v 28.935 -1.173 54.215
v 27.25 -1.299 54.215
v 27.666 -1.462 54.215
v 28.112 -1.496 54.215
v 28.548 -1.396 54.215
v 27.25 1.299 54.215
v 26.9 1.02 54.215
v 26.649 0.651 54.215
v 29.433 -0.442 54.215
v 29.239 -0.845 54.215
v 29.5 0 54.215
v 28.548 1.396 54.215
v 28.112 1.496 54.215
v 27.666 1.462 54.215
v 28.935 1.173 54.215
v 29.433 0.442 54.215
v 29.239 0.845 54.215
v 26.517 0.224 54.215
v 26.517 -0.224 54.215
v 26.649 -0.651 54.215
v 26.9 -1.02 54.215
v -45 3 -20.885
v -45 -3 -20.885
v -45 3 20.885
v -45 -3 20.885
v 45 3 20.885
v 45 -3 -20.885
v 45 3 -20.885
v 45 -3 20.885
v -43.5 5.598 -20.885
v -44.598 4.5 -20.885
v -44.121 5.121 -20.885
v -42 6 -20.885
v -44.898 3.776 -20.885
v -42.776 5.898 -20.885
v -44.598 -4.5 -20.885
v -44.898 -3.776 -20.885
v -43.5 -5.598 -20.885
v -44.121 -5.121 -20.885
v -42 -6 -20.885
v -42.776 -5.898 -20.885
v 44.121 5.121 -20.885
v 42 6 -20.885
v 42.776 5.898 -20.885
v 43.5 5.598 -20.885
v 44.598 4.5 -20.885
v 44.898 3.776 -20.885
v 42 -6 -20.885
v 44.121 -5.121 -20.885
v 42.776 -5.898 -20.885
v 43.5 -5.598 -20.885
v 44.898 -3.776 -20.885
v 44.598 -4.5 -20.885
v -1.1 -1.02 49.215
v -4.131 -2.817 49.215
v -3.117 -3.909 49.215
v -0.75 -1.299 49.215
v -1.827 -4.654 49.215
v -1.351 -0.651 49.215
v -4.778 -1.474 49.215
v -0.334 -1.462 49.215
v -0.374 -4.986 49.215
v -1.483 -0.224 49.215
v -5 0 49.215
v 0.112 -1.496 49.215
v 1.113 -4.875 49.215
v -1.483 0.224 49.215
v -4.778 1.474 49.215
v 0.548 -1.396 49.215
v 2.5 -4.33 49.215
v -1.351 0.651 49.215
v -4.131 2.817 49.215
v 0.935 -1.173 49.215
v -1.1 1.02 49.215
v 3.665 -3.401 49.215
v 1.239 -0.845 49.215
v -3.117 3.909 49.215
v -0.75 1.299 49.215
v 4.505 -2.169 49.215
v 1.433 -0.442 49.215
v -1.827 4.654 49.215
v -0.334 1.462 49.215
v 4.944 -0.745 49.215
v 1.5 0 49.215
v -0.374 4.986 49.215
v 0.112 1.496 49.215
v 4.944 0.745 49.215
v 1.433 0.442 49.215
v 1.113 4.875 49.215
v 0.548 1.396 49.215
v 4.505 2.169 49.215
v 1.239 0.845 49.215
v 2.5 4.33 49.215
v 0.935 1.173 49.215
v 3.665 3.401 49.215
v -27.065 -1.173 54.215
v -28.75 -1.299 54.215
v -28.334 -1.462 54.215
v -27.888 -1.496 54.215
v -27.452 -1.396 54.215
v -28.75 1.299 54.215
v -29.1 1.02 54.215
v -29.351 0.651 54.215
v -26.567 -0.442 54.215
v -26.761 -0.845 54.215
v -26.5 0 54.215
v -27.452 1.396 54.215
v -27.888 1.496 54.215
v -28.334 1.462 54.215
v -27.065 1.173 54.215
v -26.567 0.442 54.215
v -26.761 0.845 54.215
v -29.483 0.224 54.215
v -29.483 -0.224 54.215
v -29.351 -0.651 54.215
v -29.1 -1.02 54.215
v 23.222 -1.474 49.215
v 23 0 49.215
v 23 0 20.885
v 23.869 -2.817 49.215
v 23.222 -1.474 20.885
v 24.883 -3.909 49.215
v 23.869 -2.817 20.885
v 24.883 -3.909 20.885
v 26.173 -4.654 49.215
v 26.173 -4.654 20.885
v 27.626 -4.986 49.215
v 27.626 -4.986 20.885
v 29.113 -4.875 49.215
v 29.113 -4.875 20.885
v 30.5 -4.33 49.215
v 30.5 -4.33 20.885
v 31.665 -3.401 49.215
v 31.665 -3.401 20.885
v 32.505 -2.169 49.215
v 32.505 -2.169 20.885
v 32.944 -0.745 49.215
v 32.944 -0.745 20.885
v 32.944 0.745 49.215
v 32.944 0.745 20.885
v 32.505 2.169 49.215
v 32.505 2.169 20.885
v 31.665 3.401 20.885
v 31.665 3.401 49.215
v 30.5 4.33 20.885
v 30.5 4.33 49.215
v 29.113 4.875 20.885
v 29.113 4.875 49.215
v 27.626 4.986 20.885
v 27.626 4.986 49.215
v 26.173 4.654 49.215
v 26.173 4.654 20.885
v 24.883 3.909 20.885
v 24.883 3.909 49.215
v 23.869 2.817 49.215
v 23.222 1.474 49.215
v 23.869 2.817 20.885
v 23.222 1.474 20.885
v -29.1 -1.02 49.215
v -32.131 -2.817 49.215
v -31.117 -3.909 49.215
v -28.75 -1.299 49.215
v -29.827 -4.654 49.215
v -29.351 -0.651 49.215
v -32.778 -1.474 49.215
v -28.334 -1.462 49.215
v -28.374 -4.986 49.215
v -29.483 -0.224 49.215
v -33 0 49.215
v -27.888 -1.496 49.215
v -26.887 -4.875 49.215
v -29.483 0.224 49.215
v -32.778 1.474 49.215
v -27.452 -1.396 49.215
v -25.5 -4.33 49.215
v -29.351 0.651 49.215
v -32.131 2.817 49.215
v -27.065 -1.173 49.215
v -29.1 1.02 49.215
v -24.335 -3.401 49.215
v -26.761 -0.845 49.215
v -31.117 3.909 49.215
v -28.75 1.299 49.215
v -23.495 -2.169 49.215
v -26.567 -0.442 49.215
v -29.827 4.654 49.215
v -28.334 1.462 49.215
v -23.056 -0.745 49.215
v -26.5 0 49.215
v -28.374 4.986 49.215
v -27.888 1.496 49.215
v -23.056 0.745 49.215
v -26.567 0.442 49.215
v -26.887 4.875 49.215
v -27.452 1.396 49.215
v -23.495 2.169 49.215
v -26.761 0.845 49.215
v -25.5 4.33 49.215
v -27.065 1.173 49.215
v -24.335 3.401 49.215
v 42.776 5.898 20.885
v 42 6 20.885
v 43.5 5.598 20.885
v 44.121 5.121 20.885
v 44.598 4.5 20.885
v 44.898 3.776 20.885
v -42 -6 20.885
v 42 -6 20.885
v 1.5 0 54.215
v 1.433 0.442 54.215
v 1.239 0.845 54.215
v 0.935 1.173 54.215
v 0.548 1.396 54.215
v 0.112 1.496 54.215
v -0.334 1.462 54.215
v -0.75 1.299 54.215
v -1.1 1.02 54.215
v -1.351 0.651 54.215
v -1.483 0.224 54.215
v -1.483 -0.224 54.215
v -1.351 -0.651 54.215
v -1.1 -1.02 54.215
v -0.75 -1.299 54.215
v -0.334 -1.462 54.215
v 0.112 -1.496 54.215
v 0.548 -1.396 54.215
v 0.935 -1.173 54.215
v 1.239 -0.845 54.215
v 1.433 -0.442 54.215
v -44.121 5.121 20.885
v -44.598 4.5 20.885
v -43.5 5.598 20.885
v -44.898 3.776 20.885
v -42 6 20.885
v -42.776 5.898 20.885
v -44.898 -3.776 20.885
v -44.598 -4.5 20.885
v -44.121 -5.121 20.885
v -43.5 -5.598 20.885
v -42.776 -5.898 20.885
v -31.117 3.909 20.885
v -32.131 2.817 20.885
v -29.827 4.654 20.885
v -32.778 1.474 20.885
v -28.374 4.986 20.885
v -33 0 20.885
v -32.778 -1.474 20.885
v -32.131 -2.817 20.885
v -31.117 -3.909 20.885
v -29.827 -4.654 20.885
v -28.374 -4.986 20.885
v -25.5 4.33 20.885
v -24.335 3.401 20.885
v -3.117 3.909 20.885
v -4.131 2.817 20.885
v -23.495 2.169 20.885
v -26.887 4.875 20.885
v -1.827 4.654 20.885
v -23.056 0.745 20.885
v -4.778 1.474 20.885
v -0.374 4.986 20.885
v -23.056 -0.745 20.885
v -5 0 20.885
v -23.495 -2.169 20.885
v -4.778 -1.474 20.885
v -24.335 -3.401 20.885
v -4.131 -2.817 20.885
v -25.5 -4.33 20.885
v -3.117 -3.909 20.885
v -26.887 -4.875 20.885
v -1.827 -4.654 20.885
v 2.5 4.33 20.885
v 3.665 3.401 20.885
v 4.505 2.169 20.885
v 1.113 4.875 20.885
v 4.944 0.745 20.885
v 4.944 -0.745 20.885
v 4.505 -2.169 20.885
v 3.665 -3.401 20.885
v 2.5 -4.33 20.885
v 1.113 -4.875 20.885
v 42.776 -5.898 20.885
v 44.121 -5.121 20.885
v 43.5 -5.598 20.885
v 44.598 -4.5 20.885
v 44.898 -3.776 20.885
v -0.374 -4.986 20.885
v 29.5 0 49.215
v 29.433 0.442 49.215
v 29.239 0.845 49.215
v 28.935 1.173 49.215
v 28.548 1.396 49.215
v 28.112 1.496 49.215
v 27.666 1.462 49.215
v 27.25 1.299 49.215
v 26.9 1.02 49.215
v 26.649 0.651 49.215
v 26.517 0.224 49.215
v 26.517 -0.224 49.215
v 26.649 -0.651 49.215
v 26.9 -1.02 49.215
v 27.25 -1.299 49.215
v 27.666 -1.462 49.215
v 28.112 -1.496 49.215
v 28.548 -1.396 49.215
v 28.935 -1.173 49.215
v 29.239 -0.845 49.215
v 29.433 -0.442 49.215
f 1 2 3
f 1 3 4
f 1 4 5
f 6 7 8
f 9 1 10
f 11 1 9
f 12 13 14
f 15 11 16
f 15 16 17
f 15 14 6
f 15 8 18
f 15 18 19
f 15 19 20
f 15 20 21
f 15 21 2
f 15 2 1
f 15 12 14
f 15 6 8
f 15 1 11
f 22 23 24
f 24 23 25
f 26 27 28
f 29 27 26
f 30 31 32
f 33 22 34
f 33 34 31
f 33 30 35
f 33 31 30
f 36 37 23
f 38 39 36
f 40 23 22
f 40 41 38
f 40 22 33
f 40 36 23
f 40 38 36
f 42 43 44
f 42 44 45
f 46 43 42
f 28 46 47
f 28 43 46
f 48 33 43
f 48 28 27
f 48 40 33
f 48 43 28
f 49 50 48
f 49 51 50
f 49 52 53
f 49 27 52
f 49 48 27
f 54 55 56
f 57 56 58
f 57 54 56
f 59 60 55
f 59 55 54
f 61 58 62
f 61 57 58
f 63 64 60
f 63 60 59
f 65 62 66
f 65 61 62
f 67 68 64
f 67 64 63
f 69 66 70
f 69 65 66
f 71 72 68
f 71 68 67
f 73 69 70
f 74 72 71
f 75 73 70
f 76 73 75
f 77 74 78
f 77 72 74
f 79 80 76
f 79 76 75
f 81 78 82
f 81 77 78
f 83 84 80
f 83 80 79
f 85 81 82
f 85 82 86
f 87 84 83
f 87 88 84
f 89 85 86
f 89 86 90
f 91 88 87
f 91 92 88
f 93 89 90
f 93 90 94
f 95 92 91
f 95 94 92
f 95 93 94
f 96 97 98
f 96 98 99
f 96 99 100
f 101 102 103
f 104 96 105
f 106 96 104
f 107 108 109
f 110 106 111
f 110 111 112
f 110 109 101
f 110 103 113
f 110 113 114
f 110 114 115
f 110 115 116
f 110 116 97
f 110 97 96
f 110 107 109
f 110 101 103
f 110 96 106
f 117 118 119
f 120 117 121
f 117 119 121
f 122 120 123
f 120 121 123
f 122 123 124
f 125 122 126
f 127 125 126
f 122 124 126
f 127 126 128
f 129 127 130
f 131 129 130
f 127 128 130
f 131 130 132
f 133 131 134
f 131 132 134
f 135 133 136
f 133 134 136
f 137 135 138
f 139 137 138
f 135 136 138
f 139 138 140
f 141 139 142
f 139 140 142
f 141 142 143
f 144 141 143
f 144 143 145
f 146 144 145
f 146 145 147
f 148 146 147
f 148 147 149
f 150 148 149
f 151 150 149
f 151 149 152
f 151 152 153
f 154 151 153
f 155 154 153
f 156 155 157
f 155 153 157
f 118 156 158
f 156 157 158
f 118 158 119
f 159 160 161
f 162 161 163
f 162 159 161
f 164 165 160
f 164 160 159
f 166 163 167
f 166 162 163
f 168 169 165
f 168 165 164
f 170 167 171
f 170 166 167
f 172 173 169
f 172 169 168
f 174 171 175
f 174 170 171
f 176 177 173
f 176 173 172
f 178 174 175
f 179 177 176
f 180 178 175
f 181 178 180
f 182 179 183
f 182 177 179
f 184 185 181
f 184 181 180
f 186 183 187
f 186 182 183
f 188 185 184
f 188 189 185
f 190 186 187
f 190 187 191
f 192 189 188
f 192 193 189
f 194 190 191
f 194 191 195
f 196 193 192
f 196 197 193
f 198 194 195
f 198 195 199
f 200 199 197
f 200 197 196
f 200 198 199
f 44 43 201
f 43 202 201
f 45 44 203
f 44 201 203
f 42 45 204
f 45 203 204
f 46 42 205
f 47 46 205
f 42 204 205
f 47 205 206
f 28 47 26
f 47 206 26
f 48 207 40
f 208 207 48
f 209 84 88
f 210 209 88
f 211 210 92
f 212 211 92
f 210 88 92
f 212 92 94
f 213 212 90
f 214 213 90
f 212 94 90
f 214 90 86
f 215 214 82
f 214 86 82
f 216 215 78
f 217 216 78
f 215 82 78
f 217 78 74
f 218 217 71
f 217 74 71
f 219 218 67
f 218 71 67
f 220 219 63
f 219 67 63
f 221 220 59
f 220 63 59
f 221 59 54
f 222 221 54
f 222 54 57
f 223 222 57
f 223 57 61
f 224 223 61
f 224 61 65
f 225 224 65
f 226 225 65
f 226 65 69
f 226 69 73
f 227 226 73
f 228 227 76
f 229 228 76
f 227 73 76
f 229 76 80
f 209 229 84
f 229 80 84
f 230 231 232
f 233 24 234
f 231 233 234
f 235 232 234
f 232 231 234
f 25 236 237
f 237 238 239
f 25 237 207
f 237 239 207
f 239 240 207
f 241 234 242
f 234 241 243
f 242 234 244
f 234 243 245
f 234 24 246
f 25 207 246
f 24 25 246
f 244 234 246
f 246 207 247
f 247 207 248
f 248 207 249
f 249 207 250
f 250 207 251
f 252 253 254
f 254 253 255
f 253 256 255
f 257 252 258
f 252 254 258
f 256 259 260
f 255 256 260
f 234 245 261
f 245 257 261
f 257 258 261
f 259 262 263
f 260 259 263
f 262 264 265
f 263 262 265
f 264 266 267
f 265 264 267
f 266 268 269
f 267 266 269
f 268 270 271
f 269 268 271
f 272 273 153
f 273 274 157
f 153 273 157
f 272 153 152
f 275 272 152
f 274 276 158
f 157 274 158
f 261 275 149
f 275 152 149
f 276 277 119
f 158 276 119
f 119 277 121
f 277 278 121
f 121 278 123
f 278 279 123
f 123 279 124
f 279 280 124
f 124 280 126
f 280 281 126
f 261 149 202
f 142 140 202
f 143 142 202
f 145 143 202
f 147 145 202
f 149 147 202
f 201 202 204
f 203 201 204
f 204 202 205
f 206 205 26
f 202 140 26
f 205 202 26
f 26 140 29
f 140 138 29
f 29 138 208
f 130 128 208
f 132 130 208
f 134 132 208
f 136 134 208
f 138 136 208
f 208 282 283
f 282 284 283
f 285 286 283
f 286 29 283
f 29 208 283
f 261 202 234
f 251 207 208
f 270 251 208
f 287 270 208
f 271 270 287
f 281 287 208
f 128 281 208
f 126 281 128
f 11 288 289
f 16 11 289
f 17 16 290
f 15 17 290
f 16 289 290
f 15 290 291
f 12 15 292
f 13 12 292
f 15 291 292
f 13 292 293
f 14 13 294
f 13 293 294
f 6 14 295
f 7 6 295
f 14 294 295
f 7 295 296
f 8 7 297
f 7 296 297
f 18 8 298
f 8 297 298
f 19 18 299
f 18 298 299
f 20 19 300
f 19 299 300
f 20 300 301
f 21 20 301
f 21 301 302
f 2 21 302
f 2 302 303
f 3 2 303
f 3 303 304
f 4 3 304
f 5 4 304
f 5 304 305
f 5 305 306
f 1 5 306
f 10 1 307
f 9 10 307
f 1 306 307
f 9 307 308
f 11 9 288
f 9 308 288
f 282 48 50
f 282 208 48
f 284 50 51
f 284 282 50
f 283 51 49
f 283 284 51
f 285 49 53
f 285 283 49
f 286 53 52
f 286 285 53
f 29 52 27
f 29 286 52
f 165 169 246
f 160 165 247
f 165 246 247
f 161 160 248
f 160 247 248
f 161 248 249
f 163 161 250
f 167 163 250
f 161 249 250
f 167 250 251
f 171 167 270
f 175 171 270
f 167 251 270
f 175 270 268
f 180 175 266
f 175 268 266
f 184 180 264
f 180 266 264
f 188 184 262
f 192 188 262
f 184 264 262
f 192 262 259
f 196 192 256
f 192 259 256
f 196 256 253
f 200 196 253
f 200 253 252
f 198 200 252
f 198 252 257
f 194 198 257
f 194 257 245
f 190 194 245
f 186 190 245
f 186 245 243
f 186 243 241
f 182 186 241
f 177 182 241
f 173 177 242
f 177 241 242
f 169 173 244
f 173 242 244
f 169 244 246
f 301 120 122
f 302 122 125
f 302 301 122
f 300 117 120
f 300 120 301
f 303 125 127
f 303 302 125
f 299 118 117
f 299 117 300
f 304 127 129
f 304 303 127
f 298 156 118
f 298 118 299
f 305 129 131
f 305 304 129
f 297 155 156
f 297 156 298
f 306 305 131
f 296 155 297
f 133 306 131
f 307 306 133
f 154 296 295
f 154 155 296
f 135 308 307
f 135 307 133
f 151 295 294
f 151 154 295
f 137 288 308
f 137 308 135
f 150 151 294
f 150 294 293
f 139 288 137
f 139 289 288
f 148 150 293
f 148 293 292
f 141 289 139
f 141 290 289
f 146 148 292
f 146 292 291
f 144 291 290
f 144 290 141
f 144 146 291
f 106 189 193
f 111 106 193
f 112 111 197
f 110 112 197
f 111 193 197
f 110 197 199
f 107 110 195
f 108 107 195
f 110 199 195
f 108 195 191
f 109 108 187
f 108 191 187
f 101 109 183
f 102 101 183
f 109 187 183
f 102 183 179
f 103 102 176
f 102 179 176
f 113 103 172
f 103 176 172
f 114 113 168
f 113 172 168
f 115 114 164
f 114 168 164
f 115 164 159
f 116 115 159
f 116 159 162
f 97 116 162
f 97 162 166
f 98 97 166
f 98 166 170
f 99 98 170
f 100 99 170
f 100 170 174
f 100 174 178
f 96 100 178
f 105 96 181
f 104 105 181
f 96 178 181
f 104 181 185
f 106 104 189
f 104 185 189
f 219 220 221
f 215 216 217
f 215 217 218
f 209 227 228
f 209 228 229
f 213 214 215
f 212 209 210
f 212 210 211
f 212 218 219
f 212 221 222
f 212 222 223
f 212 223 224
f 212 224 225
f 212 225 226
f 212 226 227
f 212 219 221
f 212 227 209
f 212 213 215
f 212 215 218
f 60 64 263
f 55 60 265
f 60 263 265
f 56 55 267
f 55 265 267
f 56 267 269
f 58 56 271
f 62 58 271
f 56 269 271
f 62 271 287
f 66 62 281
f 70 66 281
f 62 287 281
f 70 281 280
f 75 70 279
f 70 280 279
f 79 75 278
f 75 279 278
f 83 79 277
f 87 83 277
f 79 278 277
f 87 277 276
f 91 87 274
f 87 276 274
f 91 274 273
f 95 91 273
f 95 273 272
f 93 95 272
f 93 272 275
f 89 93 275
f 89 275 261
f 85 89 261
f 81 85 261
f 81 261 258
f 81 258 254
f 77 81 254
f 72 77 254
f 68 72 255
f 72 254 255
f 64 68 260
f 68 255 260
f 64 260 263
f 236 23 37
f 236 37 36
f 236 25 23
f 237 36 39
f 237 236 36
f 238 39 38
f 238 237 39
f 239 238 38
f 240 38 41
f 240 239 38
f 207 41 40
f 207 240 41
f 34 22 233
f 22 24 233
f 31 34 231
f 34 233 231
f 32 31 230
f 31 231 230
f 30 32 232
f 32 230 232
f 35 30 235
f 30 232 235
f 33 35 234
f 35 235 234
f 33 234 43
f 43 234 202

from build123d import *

# Parameters (mm, degrees)
F0_W     = 90
F0_H     = 41.77
F1_DEPTH = 6
F3_DEPTH = 28.33
F4_R     = 3
F5_R     = 1.5
F6_DEPTH = 5


with BuildPart() as f1:
    # F0 (on Front) → F1 (new body, symmetric)
    with BuildSketch(Plane.XZ):
        Rectangle(F0_W, F0_H)
    extrude(amount=F1_DEPTH, both=True)

    # F2 (on face) → F3 (join)
    with BuildSketch(Plane.XY.offset(20.885)):
        with BuildLine():
            Line((-28, 0), (-23, 0))
            ThreePointArc((-23, 0), (-28, 5), (-33, 0))
            Line((-33, 0), (-28, 0))
        make_face()
        with BuildLine():
            ThreePointArc((-33, 0), (-28, -5), (-23, 0))
            Line((-23, 0), (-28, 0))
            Line((-28, 0), (-33, 0))
        make_face()
        with BuildLine():
            Line((-5, 0), (0, 0))
            Line((0, 0), (5, 0))
            ThreePointArc((5, 0), (0, 5), (-5, 0))
        make_face()
        with BuildLine():
            Line((5, 0), (0, 0))
            Line((0, 0), (-5, 0))
            ThreePointArc((-5, 0), (0, -5), (5, 0))
        make_face()
        with BuildLine():
            ThreePointArc((33, 0), (28, 5), (23, 0))
            ThreePointArc((23, 0), (28, -5), (33, 0))
        make_face()
    extrude(amount=F3_DEPTH)

    # F4
    f4_edges = [f1.edges().sort_by_distance(p)[0] for p in [
        (45, -6, 0),
        (45, 6, 0),
        (-45, -6, 0),
        (-45, 6, 0),
    ]]
    fillet(f4_edges, radius=F4_R)

    # F5 (on face) → F6 (join)
    with BuildSketch(Plane.XY.offset(49.215)):
        with Locations((-28, 0)):
            Circle(F5_R)
        Circle(F5_R)
        with Locations((28, 0)):
            Circle(F5_R)
    extrude(amount=F6_DEPTH)


solid = f1.part
